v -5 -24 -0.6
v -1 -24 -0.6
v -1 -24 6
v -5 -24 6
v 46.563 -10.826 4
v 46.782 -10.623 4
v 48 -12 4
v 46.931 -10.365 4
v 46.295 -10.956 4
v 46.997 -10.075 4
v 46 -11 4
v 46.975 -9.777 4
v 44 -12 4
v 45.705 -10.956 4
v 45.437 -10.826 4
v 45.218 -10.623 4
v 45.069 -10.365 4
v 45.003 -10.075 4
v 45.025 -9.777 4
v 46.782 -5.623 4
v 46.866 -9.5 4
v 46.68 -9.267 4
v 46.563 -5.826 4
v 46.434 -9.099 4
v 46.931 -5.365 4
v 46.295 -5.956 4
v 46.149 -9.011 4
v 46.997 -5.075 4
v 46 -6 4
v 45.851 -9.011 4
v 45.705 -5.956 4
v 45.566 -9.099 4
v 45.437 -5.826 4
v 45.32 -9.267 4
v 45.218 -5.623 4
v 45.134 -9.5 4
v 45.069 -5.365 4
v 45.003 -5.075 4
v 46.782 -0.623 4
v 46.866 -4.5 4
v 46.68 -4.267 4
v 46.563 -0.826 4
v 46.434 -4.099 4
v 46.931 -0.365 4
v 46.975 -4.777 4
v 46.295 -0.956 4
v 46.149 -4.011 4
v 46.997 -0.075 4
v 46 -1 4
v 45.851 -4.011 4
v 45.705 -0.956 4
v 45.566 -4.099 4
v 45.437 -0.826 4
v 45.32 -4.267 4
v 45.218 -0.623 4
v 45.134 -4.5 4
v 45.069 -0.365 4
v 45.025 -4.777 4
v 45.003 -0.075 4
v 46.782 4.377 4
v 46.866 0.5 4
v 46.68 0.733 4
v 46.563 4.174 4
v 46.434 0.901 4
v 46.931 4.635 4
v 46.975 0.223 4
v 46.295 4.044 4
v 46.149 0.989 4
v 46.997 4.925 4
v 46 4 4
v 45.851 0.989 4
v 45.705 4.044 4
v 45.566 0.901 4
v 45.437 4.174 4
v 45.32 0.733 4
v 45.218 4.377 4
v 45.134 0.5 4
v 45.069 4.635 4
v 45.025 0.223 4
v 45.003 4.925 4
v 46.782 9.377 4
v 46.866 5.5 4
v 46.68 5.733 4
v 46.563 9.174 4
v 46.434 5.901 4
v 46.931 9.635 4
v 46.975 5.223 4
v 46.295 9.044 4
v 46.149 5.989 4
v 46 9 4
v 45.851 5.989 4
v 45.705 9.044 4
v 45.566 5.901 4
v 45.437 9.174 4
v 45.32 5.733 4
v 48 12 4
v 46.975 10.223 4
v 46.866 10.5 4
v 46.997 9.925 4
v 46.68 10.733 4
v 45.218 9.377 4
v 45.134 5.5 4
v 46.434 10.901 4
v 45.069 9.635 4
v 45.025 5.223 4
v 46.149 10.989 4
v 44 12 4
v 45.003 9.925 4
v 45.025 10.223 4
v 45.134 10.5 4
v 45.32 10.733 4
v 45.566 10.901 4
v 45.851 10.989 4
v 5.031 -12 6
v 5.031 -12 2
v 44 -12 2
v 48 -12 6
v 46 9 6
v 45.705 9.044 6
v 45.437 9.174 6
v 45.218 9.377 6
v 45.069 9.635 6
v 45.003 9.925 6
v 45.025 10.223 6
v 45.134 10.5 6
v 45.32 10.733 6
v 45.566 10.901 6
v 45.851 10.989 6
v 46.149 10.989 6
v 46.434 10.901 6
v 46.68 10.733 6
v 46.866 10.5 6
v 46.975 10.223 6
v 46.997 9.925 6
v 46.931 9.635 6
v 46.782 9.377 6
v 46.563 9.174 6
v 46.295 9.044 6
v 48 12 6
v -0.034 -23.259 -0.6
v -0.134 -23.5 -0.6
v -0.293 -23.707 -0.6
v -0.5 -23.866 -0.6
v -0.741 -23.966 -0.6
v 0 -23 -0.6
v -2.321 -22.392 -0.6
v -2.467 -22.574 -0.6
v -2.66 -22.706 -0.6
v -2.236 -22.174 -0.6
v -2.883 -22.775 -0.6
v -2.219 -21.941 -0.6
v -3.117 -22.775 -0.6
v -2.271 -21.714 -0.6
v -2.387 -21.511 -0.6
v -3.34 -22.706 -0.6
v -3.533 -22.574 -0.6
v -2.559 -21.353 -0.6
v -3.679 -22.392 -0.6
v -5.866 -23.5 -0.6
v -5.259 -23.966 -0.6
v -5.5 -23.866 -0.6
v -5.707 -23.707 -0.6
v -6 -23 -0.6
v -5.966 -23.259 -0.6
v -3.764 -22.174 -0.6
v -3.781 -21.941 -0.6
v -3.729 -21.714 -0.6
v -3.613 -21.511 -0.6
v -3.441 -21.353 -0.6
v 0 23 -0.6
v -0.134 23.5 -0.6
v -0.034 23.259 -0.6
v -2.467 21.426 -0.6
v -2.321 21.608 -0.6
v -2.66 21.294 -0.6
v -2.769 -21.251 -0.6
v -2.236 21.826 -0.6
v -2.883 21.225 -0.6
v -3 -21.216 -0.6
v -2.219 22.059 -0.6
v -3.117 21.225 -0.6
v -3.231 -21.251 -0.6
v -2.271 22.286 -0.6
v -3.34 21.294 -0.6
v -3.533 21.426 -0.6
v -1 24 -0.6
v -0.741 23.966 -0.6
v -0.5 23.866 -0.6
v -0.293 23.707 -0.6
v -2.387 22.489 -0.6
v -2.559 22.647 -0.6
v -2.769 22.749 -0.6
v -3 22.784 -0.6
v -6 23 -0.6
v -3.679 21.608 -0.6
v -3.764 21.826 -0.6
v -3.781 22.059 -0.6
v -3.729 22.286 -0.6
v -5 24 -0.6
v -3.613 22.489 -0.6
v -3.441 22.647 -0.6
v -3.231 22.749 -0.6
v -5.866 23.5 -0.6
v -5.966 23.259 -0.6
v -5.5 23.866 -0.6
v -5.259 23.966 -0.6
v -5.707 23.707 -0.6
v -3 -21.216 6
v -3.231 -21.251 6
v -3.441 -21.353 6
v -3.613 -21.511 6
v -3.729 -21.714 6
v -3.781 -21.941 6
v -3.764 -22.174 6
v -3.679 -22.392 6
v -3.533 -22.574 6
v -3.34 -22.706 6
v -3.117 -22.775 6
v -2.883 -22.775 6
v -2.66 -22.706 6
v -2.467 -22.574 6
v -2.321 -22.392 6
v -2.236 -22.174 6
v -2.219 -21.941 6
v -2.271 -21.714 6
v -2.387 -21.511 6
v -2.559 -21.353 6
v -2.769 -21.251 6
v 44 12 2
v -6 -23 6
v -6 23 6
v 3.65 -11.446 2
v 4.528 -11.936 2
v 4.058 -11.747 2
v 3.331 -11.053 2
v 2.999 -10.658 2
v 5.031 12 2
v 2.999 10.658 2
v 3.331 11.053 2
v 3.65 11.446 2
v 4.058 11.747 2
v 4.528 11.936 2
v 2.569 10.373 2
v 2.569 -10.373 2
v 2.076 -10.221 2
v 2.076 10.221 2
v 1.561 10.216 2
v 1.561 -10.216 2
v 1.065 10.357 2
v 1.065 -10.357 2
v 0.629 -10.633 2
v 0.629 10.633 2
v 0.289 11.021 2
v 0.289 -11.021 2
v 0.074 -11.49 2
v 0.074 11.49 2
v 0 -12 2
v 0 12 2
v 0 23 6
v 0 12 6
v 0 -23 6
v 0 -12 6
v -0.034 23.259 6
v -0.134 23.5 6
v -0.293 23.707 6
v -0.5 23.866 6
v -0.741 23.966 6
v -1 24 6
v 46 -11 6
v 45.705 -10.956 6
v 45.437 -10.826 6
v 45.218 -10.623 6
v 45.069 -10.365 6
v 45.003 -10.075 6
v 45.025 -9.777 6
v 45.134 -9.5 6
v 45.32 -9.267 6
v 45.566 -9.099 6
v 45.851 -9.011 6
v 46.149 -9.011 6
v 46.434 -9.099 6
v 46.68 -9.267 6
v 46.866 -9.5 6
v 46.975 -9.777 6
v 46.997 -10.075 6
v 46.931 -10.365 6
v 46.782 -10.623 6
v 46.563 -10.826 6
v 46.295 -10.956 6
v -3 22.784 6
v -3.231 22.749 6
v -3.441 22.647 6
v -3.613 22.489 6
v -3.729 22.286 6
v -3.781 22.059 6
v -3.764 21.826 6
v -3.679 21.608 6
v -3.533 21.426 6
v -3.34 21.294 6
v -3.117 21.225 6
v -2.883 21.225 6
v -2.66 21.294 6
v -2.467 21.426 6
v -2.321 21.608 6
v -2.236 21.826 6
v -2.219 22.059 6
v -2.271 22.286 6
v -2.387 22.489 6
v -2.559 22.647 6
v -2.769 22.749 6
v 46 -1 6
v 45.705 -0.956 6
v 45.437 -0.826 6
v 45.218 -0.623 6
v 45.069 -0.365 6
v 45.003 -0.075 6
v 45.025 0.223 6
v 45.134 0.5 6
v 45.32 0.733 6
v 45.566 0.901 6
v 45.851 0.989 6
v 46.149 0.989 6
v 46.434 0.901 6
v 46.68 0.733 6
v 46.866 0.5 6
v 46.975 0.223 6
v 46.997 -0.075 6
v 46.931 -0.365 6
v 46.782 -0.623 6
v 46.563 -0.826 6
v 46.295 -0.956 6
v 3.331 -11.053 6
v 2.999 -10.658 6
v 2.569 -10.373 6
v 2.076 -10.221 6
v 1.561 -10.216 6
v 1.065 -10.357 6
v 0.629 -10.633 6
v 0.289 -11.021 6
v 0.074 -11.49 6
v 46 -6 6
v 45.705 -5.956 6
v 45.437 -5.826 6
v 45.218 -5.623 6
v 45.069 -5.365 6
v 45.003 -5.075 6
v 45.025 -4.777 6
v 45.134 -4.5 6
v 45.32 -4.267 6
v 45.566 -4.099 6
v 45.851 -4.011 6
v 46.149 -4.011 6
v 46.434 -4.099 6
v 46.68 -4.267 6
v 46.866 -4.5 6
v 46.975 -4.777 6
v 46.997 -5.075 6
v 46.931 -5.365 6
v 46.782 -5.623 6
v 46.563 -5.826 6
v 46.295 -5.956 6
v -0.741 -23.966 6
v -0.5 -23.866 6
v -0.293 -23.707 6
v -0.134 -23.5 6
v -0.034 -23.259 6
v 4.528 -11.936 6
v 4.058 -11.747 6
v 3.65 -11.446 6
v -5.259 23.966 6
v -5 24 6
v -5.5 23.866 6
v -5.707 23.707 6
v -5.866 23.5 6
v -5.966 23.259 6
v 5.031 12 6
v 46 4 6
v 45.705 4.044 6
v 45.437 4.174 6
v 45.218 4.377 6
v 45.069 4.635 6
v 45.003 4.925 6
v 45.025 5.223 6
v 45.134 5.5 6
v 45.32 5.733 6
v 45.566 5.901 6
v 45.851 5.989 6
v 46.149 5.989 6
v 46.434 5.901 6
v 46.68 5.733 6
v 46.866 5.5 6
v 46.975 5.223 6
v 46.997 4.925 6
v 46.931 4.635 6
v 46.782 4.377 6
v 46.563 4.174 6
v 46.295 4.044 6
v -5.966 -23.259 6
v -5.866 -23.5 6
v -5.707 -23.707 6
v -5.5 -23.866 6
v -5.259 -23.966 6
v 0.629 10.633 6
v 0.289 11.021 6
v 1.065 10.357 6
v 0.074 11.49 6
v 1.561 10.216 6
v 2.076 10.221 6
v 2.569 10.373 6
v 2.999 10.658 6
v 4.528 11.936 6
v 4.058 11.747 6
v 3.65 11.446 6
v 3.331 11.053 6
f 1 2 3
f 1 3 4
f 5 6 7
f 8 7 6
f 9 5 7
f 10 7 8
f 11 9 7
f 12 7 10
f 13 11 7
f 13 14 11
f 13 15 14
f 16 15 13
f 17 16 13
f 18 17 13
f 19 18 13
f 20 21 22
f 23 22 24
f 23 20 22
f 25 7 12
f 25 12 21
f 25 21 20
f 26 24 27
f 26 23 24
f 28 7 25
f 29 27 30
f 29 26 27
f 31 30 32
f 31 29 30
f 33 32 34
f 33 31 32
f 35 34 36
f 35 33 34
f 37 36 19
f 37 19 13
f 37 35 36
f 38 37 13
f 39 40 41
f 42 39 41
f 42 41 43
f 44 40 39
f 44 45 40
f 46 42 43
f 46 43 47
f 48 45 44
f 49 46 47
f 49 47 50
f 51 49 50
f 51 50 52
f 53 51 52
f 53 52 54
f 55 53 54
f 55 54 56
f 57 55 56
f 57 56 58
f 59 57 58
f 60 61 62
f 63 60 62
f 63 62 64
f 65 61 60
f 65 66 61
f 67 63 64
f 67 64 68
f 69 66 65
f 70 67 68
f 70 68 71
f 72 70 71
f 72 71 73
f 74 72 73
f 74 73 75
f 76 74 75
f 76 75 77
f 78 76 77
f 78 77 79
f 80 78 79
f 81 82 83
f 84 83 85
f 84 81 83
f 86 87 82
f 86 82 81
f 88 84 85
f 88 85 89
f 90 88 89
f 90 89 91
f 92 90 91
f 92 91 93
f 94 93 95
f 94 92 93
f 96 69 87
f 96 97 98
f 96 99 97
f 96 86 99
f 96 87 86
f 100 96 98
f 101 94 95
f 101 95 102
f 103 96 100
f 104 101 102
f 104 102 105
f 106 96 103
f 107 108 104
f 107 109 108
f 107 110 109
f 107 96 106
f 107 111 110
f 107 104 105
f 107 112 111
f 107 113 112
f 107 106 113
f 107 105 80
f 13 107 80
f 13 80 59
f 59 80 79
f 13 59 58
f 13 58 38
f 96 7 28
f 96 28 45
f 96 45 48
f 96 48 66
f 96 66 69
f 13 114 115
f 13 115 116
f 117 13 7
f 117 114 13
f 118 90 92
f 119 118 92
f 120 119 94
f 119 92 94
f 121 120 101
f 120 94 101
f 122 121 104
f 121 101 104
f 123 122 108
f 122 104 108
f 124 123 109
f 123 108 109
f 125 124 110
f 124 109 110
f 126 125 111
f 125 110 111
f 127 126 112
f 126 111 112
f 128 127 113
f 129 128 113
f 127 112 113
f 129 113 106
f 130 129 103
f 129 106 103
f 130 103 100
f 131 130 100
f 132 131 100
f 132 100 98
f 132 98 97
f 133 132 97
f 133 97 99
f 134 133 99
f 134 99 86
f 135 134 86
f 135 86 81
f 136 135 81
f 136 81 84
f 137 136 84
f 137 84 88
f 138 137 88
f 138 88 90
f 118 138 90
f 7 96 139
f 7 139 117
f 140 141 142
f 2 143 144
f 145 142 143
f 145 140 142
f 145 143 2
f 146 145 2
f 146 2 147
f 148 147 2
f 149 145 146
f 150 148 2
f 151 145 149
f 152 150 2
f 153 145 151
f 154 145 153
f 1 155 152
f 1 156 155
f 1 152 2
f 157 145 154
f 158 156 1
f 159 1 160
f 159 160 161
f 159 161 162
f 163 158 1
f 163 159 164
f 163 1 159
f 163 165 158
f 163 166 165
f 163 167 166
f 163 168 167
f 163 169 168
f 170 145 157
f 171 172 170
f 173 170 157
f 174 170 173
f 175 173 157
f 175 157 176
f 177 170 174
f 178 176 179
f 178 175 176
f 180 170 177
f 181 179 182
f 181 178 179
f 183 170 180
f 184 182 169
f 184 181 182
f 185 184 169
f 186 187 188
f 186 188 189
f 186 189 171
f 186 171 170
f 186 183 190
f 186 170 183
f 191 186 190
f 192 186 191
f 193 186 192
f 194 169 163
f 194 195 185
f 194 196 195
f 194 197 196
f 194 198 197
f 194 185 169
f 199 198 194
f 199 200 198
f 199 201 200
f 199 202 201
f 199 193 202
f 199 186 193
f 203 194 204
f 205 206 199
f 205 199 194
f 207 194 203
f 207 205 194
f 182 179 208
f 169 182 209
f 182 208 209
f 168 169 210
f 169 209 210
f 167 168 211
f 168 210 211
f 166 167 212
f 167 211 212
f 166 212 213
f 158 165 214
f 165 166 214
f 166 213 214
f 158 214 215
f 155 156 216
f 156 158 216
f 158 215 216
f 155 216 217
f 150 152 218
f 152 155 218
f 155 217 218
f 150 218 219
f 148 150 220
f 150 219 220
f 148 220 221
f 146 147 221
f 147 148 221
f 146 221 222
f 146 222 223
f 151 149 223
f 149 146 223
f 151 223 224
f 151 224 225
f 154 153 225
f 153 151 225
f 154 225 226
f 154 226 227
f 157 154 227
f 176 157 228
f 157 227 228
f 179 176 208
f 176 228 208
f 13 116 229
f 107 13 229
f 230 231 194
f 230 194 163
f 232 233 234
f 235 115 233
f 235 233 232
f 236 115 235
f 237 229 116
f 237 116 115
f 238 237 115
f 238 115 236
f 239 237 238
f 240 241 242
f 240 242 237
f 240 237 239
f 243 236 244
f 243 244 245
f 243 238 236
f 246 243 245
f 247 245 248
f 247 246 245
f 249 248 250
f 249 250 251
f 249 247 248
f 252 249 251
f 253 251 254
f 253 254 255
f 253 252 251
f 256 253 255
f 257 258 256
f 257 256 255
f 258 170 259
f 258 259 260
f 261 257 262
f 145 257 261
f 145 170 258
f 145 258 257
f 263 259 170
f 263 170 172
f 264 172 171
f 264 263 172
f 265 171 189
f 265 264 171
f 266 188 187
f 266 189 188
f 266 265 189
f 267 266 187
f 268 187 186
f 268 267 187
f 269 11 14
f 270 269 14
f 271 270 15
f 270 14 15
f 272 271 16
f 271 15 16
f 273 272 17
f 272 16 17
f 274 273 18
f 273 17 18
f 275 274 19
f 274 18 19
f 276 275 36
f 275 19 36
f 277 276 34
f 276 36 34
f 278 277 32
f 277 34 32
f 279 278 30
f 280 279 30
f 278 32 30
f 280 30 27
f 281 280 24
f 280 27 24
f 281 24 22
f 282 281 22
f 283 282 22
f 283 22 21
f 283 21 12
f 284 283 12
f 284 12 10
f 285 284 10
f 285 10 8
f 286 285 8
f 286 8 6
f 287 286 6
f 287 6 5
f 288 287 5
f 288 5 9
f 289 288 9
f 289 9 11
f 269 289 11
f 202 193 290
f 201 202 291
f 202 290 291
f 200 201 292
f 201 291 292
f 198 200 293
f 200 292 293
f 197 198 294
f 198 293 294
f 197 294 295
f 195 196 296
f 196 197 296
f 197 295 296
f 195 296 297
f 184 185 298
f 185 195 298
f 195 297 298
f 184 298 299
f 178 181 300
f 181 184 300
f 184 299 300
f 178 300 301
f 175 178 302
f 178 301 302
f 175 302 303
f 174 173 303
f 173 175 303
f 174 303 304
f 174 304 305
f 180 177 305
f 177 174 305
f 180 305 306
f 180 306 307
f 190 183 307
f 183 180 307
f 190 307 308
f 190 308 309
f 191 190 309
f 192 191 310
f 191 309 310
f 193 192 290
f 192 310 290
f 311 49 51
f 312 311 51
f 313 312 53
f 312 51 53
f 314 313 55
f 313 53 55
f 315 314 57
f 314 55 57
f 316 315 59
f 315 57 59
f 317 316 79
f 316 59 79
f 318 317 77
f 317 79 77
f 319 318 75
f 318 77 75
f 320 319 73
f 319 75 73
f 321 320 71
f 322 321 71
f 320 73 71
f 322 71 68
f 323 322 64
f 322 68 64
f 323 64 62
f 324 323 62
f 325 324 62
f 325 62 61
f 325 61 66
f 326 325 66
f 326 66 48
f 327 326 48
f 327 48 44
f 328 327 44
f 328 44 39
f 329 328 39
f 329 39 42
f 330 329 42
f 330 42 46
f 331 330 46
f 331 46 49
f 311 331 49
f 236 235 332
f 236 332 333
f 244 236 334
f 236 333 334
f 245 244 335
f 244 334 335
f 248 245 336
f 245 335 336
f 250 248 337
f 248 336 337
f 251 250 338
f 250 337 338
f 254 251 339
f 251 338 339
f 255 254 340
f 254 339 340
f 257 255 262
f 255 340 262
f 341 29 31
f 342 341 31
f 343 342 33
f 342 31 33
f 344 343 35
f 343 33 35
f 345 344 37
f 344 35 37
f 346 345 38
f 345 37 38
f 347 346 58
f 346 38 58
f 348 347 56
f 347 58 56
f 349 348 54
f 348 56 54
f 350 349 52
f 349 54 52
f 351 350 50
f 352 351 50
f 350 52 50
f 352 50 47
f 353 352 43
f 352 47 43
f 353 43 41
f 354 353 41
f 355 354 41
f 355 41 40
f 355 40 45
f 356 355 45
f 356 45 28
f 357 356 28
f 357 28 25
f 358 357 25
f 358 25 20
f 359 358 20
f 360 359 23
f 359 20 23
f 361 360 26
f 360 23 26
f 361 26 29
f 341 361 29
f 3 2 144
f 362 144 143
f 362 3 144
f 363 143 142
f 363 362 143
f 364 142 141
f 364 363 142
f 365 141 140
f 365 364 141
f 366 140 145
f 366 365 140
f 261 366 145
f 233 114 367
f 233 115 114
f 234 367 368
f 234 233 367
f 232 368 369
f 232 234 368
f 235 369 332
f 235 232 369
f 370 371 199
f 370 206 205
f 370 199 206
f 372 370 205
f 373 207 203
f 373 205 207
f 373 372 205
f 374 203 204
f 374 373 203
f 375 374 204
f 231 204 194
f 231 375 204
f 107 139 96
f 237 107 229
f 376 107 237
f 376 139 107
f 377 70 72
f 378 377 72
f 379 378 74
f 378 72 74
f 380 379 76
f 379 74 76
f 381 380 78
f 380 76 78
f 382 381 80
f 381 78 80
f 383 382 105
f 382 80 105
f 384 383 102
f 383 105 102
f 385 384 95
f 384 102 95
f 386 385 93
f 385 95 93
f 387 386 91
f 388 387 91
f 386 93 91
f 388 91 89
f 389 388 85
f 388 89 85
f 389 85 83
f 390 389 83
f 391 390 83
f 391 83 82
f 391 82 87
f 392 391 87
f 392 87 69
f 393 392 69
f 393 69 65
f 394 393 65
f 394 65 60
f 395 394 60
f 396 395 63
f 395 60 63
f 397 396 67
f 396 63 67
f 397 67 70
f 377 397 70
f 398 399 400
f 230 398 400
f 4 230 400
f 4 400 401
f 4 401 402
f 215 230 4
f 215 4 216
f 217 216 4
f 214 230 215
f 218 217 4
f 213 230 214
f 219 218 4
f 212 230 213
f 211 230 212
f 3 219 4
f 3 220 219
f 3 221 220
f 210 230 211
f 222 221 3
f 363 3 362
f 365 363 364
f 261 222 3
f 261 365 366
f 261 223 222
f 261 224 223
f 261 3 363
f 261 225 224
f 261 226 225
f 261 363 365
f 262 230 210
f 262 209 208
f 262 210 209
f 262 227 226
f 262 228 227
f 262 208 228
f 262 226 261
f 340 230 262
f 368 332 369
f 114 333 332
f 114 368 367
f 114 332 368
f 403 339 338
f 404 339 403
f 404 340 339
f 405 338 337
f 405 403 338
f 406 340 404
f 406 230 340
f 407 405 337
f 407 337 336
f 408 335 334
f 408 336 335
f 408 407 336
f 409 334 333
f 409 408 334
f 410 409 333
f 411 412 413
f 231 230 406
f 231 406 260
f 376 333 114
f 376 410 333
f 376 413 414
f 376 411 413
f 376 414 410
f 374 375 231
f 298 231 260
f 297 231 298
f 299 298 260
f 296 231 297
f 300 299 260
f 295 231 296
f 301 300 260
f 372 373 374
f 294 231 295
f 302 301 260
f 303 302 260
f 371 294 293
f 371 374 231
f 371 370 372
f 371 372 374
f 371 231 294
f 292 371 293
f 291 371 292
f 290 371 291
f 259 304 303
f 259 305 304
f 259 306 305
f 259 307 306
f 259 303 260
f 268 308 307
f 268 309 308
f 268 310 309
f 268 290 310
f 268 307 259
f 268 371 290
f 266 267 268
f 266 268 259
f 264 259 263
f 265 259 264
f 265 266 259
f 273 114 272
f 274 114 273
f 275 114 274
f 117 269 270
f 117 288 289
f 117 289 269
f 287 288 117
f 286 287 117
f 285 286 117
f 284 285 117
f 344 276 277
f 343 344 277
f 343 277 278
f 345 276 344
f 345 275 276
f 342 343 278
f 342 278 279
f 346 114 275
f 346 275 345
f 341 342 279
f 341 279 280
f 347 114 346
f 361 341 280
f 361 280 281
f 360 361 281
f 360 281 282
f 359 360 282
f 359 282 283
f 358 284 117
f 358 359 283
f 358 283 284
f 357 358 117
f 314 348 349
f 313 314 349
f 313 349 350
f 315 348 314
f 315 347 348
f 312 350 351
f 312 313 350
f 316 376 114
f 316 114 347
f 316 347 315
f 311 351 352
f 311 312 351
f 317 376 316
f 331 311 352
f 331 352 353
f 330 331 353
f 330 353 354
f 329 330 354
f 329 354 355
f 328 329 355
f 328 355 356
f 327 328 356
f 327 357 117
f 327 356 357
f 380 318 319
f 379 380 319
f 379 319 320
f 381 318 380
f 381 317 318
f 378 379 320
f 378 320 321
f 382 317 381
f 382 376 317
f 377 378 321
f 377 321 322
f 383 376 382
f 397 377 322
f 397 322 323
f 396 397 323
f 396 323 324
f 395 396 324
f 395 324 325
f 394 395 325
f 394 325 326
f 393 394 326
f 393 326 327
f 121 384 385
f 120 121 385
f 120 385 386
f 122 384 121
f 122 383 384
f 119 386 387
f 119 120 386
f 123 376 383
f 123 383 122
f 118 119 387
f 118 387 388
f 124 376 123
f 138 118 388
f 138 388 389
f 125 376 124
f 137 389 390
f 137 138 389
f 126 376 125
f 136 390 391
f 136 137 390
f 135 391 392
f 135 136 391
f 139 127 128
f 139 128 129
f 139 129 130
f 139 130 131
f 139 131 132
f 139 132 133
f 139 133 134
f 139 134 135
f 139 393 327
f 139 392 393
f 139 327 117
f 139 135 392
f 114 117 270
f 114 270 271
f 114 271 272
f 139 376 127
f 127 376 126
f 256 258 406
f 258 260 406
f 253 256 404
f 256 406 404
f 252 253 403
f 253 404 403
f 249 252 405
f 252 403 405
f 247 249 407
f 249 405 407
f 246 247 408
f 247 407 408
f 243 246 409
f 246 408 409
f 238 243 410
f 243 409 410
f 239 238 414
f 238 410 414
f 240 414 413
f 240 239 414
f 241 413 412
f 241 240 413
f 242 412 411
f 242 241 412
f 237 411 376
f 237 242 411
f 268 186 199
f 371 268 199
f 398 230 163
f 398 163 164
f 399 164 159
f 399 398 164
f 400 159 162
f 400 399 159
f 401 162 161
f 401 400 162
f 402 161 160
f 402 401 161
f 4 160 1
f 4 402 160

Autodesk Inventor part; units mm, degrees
ref_plane "YZ Plane" through (0, 0, 0) normal (1, 0, 0) x (0, 1, 0)
ref_plane "XZ Plane" through (0, 0, 0) normal (0, 1, 0) x (-1, 0, 0)
ref_plane "XY Plane" through (0, 0, 0) normal (0, 0, 1) x (1, 0, 0)
sketch "Skizze1" plane through (0, 0, 0) normal (0, 0, 1) x (1, 0, 0)
  line L0 (-6, 12) -> (48, 12)
  line L1 (48, 12) -> (48, -12)
  line L2 (48, -12) -> (-6, -12)
  line L3 (-16.8, 0) -> (58.8, 0) projected
  line L4 (0, 16.8) -> (0, -16.8) projected
  line L5 (-6, 12) -> (-6, -12)
  point P0 (0, 0)
  dimension "d2" = 24
  dimension "d3" = 54
  dimension "d59" = 6
extrude "Extrusion1" add sketch "Skizze1" along normal blind 6
sketch "Skizze2" plane through (0, 0, 0) normal (0, 0, -1) x (-1, 0, 0)
  line L0 (-48, -12) -> (6, -12) projected
  line L1 (-48, 12) -> (-48, -12) projected
  line L2 (-48, 12) -> (6, 12) projected
  line L3 (6, -12) -> (-48, -12)
  line L4 (-48, -12) -> (-48, 12)
  line L5 (-48, 12) -> (6, 12)
  line L6 (6, 12) -> (6, -12)
  point P0 (0, 0)
extrude "Extrusion2" cut sketch "Skizze2" against normal blind 2
sketch "Skizze3" plane through (0, 0, 2) normal (0, 0, -1) x (-1, 0, 0)
  line L0 (6, -12) -> (-48, -12) projected
  line L1 (-48, -12) -> (-48, 12) projected
  line L2 (-48, 12) -> (6, 12) projected
  line L3 (-48, -12) -> (-44, -12)
  line L4 (-44, -12) -> (-44, 12)
  line L5 (-44, 12) -> (-48, 12)
  line L6 (-48, 12) -> (-48, -12)
  point P0 (0, 0)
  point P1 (0, -12.5)
  dimension "d9" = 4
extrude "Extrusion3" cut sketch "Skizze3" against normal blind 2
sketch "Skizze4" plane through (0, 0, 6) normal (0, 0, 1) x (1, 0, 0)
  line L0 (48, -12) -> (48, 12) projected
  line L1 (-17, 0) -> (60, 0) projected
  point P0 (0, 0)
  point P1 (46, 0)
  dimension "d12" = 2
hole "Bohrung1" at (46, 0, 6) direction (0, 0, -1) diameter 2 end through all
pattern_linear "Rechteckige Anordnung1" count 5 spacing 5 along (0, 1, 0) of "Bohrung1" first direction both ways yes
sketch "Skizze7" plane through (0, 0, 2) normal (0, 0, -1) x (-1, 0, 0)
  line L0 (-44, 12) -> (-44, -12) projected
  line L1 (6, -12) -> (-44, -12) projected
  line L2 (6, 12) -> (6, -12) projected
  line L3 (-44, 12) -> (6, 12) projected
  line L4 (-48, 12) -> (6, 12) projected
  line L5 (6, -12) -> (0, -12)
  line L6 (0, -12) -> (0, 12)
  line L7 (0, 12) -> (6, 12)
  line L8 (6, 12) -> (6, -12)
  point P0 (0, 0)
extrude "Extrusion4" add sketch "Skizze7" along normal blind 2.8 contours L3 L2 L1 L6
sketch "Skizze8" plane through (0, 0, -0.8) normal (0, 0, -1) x (-1, 0, 0)
  line L0 (6, -12) -> (6, 12) projected
  line L1 (6, 12) -> (0, 12) projected
  line L2 (0, 12) -> (0, -12) projected
  line L3 (0, -12) -> (6, -12) projected
  line L4 (-58.8, 0) -> (16.8, 0) projected
  line L5 (6, 12) -> (0, 12)
  line L6 (0, 12) -> (0, 24)
  line L7 (0, 24) -> (6, 24)
  line L8 (6, 24) -> (6, 12)
  line L9 (6, -12) -> (-48, -12) projected
  line L10 (6, -12) -> (0, -12)
  line L11 (0, -12) -> (0, -24)
  line L12 (0, -24) -> (6, -24)
  line L13 (6, -24) -> (6, -12)
  line L14 (6, -12) -> (6, 12) projected
  dimension "d67" = 48
extrude "Extrusion5" add sketch "Skizze8" against normal up to surface (6.8 mm away)
sketch "Skizze9" plane through (0, 0, 6) normal (0, 0, 1) x (1, 0, 0)
  line L0 (0, -12) -> (48, -12) projected
  line L1 (48, -12) -> (48, 12) projected
  line L2 (48, 12) -> (0, 12) projected
  line L3 (0, 24) -> (0, 12) projected
  line L4 (-6, 24) -> (0, 24) projected
  line L5 (-6, -24) -> (-6, 24) projected
  line L6 (0, -24) -> (-6, -24) projected
  line L7 (0, -12) -> (0, -24) projected
  circle A0 centre (46, 0) radius 1 projected
  circle A1 centre (46, -10) radius 1 projected
  circle A2 centre (46, -5) radius 1 projected
  circle A3 centre (46, 5) radius 1 projected
  circle A4 centre (46, 10) radius 1 projected
  line L8 (44, 12) -> (0, 12) projected
  arc A5 (0, 12) -> (3.6, 12) centre (1.8, 12) ccw
  line L9 (0, -12) -> (44, -12) projected
  arc A6 (3.6, -12) -> (0, -12) centre (1.8, -12) ccw
  line L10 (-17, 0) -> (60, 0) projected
  point P0 (0, 0)
  dimension "d68" = 1.8
extrude "Extrusion6" cut sketch "Skizze9" against normal through all contours A6 L0 | L2 A5
fillet "Rundung1" radius 2 4 edges at (0, -12, 4) (3.6, -12, 4) (0, 12, 4) (3.6, 12, 4)
sketch "Skizze10" plane through (0, 0, -0.8) normal (0, 0, -1) x (-1, 0, 0)
  line L0 (0, -24) -> (0, 24) projected
  line L1 (-58.8, 0) -> (16.8, 0) projected
  line L2 (0, -22) -> (6, -22) construction
  line L3 (6, 24) -> (6, -24) projected
  point P0 (0, 0)
  point P1 (3, -22)
  point P2 (3, 22)
  dimension "d72" = 22
hole "Bohrung4" at (-3, -22, -0.8) at (-3, 22, -0.8) direction (0, 0, 1) diameter 1.567 end through all thread size "M2x0.4" class "6H" standard "ISO Metric profile"
fillet "Rundung2" radius 1 4 edges at (0, 24, 2.6) (-6, 24, 2.6) (0, -24, 2.6) (-6, -24, 2.6)
sketch "Skizze11" plane through (0, 0, -0.8) normal (0, 0, -1) x (-1, 0, 0)
  arc A0 (5, -24) -> (6, -23) centre (5, -23) ccw projected
  line L0 (6, 23) -> (6, -23) projected
  arc A1 (6, 23) -> (5, 24) centre (5, 23) ccw projected
  line L1 (1, 24) -> (5, 24) projected
  arc A2 (1, 24) -> (0, 23) centre (1, 23) ccw projected
  line L2 (0, -23) -> (0, 23) projected
  arc A3 (0, -23) -> (1, -24) centre (1, -23) ccw projected
  line L3 (5, -24) -> (1, -24) projected
  circle A4 centre (3, -22) radius 0.7835 projected
  circle A5 centre (3, 22) radius 0.7835 projected
  point P0 (0, 0)
extrude "Extrusion7" cut sketch "Skizze11" against normal blind 0.2
properties part number "Kicker Chip" material "Aluminium 6061"
